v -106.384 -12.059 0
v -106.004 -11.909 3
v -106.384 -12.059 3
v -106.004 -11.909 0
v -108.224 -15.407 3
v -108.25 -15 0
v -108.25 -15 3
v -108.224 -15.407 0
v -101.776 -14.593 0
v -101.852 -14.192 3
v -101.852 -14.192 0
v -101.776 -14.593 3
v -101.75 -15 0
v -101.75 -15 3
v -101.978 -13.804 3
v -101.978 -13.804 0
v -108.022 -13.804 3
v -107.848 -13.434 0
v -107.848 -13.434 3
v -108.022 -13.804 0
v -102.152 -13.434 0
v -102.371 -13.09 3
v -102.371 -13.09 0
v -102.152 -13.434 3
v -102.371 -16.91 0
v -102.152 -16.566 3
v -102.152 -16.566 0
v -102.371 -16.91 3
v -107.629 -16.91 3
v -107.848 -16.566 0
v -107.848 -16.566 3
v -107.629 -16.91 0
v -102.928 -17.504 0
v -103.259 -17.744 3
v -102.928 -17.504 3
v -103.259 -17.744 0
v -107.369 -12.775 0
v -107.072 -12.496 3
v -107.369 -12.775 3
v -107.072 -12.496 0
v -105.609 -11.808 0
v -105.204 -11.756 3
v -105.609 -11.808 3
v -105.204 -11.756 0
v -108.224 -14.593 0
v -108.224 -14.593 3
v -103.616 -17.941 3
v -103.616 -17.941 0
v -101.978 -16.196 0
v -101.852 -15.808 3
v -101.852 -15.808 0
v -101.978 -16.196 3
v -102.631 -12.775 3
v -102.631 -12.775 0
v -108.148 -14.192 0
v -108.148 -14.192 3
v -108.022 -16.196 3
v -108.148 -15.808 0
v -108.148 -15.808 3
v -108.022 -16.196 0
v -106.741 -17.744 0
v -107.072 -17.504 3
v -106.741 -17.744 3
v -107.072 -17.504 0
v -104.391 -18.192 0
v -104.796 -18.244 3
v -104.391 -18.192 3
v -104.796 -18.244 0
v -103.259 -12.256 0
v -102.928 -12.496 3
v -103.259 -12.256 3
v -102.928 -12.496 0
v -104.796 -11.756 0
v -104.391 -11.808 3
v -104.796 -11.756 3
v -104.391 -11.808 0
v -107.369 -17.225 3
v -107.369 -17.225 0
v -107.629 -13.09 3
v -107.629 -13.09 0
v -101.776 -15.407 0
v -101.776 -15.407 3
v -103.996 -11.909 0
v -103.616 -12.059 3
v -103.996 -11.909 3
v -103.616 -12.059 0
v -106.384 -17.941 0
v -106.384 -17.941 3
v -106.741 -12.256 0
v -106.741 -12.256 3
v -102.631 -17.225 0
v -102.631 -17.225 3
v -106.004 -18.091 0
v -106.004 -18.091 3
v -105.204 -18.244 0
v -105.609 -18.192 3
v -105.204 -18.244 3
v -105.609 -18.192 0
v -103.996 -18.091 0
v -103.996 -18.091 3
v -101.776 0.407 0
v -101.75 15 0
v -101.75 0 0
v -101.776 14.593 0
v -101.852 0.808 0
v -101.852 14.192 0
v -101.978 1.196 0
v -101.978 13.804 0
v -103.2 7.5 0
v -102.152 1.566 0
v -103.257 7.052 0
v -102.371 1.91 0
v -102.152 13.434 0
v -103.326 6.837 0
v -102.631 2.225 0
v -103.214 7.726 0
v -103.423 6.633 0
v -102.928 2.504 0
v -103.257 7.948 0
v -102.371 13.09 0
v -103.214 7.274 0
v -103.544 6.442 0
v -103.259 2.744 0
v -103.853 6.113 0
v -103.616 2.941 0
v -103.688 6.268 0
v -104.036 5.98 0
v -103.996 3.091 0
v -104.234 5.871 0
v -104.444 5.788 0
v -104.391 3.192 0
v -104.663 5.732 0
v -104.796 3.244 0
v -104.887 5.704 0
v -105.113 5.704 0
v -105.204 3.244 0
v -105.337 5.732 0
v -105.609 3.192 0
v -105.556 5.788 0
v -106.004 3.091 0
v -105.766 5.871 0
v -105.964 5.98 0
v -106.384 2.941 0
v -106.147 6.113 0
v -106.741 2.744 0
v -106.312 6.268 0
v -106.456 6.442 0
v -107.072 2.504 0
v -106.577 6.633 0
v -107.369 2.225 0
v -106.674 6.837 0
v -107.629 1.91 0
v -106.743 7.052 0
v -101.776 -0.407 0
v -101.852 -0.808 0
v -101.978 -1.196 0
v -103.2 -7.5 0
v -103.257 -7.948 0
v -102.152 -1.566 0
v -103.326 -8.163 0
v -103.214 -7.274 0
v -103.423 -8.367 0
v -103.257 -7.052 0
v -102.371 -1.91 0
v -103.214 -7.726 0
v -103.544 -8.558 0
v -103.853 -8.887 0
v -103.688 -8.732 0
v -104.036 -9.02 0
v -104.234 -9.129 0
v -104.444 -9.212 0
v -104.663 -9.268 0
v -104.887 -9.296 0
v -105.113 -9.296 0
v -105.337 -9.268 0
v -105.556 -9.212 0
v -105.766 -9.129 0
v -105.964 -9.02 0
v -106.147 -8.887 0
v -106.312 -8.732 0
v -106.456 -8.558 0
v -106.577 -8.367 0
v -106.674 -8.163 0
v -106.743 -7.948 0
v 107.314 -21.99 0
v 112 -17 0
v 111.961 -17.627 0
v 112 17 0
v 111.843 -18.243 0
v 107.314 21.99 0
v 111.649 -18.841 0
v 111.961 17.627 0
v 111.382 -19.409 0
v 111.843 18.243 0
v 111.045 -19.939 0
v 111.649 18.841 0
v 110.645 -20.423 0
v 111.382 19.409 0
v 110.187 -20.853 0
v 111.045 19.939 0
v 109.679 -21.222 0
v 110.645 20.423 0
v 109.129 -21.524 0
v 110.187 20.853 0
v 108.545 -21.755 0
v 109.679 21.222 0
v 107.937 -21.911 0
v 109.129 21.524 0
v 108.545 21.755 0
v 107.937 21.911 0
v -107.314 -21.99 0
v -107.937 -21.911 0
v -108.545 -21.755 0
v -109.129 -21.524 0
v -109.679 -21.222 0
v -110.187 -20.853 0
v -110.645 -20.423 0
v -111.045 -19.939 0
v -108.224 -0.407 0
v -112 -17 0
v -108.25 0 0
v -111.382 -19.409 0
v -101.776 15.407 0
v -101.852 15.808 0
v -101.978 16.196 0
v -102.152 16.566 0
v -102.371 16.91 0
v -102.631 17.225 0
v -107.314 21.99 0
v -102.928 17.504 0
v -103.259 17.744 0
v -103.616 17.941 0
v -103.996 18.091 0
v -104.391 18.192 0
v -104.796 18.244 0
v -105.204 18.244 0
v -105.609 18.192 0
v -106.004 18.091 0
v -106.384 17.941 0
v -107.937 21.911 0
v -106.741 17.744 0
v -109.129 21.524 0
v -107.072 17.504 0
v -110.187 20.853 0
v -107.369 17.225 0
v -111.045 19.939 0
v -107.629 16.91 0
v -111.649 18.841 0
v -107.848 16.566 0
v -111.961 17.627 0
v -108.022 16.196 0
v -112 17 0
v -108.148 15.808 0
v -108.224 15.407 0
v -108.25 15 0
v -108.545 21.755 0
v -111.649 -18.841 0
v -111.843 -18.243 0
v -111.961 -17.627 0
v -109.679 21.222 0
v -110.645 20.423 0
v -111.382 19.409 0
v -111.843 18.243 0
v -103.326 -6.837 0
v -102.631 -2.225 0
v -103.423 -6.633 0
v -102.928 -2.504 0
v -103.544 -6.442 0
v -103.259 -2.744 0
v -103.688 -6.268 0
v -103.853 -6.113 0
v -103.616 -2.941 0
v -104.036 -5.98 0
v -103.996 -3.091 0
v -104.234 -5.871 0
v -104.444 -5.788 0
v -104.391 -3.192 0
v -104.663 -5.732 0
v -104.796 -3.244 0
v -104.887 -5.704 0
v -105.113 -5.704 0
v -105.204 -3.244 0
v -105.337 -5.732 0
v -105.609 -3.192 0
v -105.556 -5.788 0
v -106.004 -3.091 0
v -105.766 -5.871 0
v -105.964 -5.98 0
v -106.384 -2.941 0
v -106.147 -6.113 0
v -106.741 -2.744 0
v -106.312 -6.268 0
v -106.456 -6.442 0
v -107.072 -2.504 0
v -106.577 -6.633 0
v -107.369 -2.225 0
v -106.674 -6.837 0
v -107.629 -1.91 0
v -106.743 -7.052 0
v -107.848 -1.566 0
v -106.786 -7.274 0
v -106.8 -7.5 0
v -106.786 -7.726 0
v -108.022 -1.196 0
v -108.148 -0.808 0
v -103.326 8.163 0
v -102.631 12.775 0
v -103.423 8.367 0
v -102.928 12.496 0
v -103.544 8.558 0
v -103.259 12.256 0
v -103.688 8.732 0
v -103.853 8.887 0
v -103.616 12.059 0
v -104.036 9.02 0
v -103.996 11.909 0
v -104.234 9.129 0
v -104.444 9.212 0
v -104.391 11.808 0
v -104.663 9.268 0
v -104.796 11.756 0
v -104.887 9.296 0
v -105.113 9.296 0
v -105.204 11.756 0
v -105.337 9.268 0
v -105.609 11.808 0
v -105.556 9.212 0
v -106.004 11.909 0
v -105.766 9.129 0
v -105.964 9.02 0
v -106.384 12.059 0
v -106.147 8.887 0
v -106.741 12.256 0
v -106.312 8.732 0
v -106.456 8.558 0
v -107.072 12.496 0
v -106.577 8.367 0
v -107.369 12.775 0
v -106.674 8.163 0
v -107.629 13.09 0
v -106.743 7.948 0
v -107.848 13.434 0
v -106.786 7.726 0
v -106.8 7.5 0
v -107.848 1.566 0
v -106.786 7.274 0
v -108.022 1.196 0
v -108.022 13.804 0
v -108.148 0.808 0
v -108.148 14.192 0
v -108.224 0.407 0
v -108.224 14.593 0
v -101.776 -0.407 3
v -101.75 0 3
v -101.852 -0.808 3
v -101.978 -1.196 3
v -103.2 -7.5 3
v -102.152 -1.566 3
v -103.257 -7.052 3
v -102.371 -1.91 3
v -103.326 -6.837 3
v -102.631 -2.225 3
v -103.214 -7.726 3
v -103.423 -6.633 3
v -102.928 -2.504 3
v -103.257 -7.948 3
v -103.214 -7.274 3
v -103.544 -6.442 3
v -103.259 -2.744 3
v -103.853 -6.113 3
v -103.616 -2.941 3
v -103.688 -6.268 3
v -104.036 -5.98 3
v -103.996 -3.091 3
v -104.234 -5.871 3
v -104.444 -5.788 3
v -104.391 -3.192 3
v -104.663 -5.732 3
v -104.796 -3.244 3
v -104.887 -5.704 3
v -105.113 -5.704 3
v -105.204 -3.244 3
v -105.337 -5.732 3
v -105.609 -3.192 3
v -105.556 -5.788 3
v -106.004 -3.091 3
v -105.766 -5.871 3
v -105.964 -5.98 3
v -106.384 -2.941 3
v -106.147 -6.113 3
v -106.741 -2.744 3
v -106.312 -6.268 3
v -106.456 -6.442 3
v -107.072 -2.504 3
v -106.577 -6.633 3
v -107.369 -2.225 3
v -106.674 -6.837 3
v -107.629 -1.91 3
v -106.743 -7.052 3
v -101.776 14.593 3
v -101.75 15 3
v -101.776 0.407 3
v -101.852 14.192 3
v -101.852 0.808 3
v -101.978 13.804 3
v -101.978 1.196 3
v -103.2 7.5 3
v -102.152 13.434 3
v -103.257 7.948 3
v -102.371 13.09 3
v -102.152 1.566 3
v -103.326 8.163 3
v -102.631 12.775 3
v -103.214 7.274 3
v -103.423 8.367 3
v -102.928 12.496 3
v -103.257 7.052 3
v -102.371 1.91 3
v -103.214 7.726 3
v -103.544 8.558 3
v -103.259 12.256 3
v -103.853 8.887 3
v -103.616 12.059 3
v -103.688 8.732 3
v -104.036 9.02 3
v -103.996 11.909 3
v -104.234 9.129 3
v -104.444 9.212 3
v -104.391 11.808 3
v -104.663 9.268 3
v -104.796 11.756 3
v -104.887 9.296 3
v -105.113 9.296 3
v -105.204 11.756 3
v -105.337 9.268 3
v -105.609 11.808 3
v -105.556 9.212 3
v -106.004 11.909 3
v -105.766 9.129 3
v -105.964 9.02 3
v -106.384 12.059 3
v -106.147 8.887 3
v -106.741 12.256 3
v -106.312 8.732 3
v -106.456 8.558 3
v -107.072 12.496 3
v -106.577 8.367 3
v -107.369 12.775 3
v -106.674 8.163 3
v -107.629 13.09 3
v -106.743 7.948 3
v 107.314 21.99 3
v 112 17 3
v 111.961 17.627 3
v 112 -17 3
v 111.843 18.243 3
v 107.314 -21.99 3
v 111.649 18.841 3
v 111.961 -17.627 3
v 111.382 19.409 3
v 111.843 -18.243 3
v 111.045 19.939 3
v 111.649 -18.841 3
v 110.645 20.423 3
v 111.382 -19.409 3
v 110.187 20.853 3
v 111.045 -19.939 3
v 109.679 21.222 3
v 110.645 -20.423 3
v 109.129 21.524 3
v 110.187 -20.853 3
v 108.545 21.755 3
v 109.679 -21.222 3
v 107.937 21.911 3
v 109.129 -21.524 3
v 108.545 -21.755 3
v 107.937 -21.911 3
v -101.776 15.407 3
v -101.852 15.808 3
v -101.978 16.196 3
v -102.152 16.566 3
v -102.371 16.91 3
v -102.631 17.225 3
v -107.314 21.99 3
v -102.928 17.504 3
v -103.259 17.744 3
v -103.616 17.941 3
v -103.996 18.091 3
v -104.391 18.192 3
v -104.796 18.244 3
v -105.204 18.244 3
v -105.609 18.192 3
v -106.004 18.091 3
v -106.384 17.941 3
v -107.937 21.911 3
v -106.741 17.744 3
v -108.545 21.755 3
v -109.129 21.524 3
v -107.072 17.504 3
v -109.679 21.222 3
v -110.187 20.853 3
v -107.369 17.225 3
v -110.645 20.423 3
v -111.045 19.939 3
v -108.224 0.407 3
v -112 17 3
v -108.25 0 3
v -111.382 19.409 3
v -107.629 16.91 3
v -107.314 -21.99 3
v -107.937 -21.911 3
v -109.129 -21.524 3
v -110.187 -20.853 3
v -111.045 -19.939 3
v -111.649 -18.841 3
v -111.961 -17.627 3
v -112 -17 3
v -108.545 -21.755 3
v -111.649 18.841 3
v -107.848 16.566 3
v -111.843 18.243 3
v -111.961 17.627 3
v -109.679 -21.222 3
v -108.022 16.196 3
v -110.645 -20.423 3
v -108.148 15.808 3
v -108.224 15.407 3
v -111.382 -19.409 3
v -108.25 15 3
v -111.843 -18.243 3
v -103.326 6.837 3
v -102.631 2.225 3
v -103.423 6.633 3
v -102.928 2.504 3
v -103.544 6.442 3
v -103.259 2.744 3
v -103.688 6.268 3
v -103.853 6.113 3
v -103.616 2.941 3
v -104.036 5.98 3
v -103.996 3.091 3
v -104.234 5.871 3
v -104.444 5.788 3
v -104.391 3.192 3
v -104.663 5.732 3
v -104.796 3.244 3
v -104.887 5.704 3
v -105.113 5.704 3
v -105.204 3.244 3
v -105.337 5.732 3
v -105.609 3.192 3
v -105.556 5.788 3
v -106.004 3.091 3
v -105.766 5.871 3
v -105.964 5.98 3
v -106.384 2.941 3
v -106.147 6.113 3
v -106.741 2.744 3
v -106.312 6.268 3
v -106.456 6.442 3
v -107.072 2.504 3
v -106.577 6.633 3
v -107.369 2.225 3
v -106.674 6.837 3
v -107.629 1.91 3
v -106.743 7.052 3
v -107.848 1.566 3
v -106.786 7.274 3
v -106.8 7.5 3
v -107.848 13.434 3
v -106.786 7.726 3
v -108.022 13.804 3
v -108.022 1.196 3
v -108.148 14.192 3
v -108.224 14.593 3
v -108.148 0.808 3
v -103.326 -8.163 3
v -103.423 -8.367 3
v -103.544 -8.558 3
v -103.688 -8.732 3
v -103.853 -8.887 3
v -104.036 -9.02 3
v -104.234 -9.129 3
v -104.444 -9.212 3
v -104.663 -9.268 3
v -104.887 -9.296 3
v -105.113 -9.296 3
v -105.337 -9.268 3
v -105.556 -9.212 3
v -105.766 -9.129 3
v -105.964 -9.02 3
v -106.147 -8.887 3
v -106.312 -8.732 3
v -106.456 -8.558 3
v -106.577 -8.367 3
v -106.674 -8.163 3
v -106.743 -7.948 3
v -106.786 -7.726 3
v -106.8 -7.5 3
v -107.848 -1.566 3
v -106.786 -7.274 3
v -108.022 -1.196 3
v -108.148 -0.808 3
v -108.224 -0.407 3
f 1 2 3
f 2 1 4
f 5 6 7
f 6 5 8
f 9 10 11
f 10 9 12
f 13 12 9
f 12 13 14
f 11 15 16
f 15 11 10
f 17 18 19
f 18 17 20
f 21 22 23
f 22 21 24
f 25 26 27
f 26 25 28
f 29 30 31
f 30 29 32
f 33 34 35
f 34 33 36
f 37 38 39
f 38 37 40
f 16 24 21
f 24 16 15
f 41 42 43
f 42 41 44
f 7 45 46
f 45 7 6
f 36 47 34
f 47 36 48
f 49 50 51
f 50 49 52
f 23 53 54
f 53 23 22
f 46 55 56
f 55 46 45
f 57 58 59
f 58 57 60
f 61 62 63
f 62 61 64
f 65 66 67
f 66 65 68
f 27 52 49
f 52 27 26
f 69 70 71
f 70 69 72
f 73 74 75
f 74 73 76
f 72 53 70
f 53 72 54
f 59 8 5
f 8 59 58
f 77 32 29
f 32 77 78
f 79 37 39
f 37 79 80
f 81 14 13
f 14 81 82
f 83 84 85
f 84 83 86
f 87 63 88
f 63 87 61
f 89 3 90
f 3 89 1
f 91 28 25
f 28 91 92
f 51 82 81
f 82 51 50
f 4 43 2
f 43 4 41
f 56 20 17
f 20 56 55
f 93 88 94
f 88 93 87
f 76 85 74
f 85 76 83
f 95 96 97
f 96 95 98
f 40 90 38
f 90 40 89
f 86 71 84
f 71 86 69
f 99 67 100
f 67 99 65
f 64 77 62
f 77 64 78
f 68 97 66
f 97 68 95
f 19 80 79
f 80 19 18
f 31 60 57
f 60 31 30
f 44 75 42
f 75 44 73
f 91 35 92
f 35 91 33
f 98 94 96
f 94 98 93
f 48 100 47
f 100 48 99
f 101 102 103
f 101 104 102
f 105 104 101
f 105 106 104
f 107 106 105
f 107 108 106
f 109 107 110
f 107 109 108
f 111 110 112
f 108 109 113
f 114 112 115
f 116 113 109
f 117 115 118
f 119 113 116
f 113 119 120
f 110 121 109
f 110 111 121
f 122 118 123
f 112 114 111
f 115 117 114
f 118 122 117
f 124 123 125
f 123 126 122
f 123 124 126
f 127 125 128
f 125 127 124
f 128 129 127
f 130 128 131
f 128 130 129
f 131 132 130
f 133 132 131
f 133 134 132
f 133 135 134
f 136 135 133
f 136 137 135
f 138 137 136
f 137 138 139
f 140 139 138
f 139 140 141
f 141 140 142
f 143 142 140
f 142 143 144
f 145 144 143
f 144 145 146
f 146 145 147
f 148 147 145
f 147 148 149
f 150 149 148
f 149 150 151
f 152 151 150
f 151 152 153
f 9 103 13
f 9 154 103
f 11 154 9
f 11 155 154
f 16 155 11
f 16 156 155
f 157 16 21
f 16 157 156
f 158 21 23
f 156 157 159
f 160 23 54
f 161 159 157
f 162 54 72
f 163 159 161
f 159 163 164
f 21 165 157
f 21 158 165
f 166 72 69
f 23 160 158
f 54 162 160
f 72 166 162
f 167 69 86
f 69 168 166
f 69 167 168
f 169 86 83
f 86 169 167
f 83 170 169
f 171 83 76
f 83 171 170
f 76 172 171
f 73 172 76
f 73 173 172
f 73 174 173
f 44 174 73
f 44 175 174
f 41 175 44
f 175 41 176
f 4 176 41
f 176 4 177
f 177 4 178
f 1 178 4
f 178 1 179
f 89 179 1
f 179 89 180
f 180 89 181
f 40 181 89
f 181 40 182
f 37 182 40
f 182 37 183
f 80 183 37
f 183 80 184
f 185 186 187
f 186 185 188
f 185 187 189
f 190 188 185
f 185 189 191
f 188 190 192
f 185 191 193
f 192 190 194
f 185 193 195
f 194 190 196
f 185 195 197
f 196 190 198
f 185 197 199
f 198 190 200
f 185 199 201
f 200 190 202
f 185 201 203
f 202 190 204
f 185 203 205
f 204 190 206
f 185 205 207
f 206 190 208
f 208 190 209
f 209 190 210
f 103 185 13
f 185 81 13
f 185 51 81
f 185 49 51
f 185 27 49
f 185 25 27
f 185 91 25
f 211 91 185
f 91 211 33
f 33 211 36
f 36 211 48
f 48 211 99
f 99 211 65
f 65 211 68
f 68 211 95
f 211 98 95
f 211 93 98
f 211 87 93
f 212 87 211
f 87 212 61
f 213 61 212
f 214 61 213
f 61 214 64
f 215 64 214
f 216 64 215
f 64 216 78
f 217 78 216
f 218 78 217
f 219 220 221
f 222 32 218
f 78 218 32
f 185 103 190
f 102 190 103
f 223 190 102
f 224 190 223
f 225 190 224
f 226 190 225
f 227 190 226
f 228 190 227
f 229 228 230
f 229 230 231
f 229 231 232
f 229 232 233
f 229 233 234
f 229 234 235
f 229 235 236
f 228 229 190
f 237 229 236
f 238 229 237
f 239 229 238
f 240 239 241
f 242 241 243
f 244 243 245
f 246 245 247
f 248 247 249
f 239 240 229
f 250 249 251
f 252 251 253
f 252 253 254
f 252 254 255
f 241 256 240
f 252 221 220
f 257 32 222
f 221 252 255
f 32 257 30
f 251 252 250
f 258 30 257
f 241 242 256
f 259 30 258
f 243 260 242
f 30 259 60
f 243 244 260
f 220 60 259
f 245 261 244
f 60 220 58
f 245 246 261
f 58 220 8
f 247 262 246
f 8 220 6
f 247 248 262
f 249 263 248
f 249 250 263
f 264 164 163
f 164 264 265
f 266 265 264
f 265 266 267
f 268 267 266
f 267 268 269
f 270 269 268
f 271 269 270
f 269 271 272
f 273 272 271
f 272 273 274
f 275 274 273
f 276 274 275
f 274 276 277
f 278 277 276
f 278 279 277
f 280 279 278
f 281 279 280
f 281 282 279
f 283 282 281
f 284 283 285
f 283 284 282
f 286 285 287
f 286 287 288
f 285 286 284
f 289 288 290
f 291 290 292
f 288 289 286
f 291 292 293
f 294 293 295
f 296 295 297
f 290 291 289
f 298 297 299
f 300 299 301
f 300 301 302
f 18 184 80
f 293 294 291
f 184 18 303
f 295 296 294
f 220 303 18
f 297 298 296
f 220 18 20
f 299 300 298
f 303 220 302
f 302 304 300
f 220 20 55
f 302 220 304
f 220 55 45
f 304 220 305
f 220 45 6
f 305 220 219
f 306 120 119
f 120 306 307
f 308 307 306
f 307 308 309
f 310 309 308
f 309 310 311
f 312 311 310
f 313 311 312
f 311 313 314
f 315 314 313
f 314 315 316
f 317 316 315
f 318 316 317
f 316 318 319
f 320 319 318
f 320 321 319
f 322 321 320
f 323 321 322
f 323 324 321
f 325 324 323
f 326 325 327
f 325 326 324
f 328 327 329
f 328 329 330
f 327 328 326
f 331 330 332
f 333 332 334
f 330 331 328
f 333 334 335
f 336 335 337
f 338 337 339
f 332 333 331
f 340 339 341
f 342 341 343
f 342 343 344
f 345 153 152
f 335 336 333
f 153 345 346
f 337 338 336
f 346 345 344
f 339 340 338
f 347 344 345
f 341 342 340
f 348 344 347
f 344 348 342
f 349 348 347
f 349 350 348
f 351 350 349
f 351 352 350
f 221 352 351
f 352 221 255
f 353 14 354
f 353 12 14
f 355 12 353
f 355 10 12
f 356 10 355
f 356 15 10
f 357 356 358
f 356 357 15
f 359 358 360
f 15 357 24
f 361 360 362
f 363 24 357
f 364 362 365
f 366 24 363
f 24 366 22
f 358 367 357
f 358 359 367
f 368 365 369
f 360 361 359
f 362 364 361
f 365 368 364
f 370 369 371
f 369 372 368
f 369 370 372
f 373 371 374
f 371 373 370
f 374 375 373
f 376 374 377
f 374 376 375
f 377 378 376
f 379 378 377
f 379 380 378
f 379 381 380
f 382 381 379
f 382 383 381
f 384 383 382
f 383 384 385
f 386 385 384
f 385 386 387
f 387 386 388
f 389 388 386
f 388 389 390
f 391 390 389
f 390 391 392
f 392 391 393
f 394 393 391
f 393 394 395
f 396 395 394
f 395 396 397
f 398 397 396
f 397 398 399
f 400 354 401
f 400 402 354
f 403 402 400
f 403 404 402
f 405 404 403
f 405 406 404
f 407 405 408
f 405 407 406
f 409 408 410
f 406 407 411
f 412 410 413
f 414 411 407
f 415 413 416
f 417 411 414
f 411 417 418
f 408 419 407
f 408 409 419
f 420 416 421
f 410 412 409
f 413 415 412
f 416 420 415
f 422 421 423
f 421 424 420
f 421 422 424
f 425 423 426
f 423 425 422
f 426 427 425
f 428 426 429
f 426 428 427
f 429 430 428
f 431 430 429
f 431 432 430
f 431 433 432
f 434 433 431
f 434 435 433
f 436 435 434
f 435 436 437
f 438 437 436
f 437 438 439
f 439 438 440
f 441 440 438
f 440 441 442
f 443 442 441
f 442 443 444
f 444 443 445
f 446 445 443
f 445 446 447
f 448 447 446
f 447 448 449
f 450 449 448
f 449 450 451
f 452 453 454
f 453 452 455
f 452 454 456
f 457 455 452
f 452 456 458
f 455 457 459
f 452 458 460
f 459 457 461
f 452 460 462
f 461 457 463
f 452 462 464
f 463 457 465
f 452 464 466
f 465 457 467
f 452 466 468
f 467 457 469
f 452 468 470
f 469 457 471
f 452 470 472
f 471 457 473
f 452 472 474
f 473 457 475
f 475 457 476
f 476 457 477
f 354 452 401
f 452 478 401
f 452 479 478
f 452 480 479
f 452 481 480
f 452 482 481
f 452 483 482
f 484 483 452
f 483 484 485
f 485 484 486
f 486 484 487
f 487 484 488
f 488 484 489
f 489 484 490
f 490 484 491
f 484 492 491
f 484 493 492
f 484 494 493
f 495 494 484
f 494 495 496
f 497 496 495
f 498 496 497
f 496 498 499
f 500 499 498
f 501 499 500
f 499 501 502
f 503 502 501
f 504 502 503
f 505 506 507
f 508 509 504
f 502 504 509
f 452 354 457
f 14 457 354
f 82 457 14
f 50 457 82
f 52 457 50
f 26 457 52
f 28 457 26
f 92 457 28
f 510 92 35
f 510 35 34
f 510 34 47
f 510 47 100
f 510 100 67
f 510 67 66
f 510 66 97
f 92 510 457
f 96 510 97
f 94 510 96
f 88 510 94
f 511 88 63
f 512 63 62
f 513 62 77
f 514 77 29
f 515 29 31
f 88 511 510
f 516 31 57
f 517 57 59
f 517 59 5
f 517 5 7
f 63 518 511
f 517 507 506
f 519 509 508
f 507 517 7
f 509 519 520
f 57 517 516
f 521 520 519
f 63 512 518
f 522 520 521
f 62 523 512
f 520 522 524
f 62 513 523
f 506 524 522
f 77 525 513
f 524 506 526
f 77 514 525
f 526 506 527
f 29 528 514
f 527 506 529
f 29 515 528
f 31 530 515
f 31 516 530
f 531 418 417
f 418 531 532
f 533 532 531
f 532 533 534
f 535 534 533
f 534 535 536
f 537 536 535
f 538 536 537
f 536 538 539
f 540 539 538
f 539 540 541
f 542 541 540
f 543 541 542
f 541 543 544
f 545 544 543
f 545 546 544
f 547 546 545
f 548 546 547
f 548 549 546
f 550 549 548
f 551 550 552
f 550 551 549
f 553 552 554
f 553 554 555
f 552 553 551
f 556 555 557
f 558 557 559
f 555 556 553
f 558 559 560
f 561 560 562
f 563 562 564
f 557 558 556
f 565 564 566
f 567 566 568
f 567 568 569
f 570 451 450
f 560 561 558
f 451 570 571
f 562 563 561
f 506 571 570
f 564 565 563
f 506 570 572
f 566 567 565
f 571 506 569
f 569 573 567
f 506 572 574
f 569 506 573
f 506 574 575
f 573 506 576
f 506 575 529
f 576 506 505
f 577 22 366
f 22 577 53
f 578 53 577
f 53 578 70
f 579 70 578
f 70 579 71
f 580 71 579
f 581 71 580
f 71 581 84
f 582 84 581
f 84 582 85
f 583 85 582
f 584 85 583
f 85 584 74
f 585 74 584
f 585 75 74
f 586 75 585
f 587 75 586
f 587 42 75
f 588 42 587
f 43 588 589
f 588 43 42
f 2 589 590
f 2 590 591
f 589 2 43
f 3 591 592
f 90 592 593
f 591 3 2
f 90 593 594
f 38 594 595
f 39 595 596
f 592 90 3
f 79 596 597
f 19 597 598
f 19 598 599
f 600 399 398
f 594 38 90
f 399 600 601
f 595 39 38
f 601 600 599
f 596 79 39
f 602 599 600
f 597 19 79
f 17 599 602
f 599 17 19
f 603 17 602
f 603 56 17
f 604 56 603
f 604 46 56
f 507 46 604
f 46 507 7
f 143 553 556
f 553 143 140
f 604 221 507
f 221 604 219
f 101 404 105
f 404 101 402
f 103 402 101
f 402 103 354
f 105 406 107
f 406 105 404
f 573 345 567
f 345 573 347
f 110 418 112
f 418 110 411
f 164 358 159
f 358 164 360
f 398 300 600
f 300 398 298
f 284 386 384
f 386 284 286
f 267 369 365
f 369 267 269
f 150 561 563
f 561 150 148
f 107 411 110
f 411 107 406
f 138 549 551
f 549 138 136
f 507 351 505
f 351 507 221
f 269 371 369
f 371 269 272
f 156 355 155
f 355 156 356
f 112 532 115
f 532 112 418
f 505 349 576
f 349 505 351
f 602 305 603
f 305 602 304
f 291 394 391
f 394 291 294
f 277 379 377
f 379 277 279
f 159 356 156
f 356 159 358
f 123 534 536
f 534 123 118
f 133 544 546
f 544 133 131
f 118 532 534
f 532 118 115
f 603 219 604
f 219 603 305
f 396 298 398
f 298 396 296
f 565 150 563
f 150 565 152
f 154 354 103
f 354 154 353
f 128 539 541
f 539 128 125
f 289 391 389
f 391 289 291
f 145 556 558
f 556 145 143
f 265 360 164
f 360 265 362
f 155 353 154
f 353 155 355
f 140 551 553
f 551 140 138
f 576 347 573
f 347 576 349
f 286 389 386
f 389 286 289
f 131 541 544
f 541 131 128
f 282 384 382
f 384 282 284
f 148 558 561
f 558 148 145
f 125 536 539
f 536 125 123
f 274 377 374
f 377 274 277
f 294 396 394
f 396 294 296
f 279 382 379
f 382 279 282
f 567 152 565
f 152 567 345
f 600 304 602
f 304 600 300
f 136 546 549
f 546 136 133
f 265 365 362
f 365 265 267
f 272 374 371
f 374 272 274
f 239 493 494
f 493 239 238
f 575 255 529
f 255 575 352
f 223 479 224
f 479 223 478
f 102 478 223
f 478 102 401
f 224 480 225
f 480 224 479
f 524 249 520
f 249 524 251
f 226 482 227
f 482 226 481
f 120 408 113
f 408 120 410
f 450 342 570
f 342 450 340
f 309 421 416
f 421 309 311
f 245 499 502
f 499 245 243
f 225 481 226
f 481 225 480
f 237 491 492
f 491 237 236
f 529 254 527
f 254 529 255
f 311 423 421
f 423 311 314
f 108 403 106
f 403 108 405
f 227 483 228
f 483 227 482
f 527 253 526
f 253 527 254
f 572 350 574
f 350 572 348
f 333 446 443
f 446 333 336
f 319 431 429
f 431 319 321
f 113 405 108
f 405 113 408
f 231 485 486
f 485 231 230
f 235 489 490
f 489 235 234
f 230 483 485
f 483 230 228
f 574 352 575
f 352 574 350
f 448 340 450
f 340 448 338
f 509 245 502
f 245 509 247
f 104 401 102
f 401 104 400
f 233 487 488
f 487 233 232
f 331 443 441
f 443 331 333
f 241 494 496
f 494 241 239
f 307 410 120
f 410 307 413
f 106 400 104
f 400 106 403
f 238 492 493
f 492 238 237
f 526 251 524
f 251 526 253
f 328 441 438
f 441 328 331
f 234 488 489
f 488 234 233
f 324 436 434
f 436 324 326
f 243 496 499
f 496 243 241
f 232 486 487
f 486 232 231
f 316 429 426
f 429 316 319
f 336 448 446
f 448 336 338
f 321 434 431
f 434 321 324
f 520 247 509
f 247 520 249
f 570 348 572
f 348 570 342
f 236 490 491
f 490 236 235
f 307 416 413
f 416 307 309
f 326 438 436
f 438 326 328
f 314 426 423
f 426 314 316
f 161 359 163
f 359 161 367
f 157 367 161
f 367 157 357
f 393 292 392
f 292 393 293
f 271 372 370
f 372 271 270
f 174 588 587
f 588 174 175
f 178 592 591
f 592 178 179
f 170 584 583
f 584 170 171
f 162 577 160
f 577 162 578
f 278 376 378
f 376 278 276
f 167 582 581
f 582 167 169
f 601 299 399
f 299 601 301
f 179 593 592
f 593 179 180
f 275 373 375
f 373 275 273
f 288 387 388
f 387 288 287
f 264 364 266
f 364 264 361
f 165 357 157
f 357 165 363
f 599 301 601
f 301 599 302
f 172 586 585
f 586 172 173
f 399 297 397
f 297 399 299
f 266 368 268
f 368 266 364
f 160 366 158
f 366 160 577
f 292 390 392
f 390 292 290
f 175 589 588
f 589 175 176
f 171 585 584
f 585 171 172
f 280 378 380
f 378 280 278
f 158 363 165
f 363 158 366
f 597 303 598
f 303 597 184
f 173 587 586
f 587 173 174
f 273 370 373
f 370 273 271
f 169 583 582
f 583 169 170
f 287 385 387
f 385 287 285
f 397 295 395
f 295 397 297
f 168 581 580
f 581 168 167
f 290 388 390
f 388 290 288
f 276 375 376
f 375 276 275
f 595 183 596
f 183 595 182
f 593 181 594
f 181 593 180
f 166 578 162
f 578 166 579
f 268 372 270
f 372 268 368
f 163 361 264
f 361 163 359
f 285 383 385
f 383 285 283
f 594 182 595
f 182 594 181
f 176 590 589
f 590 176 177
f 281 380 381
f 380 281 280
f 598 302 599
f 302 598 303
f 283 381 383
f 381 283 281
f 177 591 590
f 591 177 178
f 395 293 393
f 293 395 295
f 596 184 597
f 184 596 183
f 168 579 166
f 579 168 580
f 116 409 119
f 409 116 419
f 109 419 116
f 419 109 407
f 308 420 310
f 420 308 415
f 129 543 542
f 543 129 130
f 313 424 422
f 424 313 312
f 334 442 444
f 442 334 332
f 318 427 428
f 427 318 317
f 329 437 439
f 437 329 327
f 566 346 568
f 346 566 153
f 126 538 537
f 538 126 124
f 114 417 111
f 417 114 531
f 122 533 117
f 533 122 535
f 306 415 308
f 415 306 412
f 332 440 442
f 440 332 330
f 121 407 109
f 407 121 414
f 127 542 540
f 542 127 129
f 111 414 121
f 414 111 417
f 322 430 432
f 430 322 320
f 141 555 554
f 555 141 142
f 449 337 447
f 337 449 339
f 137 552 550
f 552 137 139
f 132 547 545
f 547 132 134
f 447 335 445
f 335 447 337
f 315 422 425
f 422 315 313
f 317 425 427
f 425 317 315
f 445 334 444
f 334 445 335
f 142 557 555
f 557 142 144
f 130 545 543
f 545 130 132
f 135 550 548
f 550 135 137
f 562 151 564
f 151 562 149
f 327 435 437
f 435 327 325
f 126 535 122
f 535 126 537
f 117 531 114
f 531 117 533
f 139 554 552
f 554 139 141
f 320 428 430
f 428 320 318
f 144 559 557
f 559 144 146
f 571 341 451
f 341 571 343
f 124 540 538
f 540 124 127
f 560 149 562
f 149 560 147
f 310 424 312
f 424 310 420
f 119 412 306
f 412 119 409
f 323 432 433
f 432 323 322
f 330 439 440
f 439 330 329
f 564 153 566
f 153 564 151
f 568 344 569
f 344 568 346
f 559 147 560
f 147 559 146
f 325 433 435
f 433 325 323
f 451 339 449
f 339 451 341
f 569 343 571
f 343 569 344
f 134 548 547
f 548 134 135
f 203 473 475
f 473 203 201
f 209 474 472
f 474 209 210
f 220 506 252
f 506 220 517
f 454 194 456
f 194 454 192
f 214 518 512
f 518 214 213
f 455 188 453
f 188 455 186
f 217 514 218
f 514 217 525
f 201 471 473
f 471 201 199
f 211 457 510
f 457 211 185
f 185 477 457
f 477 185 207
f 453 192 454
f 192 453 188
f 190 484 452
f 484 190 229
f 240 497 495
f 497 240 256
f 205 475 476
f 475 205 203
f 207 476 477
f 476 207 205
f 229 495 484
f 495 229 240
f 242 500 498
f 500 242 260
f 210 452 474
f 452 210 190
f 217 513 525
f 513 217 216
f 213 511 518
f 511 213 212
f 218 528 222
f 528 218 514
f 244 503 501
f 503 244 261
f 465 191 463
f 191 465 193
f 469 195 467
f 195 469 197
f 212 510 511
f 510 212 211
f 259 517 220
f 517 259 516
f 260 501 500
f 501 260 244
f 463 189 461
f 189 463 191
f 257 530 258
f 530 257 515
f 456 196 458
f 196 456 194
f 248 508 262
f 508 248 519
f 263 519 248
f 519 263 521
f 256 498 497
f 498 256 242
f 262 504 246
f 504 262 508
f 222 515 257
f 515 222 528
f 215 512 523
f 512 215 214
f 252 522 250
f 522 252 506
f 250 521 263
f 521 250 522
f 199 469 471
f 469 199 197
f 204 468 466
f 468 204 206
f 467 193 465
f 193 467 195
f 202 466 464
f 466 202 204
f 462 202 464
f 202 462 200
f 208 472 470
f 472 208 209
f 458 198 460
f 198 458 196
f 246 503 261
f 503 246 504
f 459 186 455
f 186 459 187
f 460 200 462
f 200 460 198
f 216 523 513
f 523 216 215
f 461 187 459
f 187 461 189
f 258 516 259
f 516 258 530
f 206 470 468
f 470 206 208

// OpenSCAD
$fn = 50;


difference() {
	union() {
		hull() {
			translate(v = [-107.0000000000, 17.0000000000, 0]) {
				cylinder(h = 3, r = 5);
			}
			translate(v = [107.0000000000, 17.0000000000, 0]) {
				cylinder(h = 3, r = 5);
			}
			translate(v = [-107.0000000000, -17.0000000000, 0]) {
				cylinder(h = 3, r = 5);
			}
			translate(v = [107.0000000000, -17.0000000000, 0]) {
				cylinder(h = 3, r = 5);
			}
		}
	}
	union() {
		translate(v = [-105.0000000000, -15.0000000000, 0]) {
			cylinder(h = 3, r = 3.2500000000);
		}
		translate(v = [-105.0000000000, 0.0000000000, 0]) {
			cylinder(h = 3, r = 3.2500000000);
		}
		translate(v = [-105.0000000000, 15.0000000000, 0]) {
			cylinder(h = 3, r = 3.2500000000);
		}
		translate(v = [-105.0000000000, -15.0000000000, 0]) {
			cylinder(h = 3, r = 1.8000000000);
		}
		translate(v = [-105.0000000000, -7.5000000000, 0]) {
			cylinder(h = 3, r = 1.8000000000);
		}
		translate(v = [-105.0000000000, 0.0000000000, 0]) {
			cylinder(h = 3, r = 1.8000000000);
		}
		translate(v = [-105.0000000000, 7.5000000000, 0]) {
			cylinder(h = 3, r = 1.8000000000);
		}
		translate(v = [-105.0000000000, 15.0000000000, 0]) {
			cylinder(h = 3, r = 1.8000000000);
		}
		translate(v = [-105.0000000000, -15.0000000000, 0]) {
			cylinder(h = 3, r = 1.8000000000);
		}
		translate(v = [-105.0000000000, -7.5000000000, 0]) {
			cylinder(h = 3, r = 1.8000000000);
		}
		translate(v = [-105.0000000000, 0.0000000000, 0]) {
			cylinder(h = 3, r = 1.8000000000);
		}
		translate(v = [-105.0000000000, 7.5000000000, 0]) {
			cylinder(h = 3, r = 1.8000000000);
		}
		translate(v = [-105.0000000000, 15.0000000000, 0]) {
			cylinder(h = 3, r = 1.8000000000);
		}
		translate(v = [-105.0000000000, -15.0000000000, 0]) {
			cylinder(h = 3, r = 1.8000000000);
		}
		translate(v = [-105.0000000000, -7.5000000000, 0]) {
			cylinder(h = 3, r = 1.8000000000);
		}
		translate(v = [-105.0000000000, 0.0000000000, 0]) {
			cylinder(h = 3, r = 1.8000000000);
		}
		translate(v = [-105.0000000000, 7.5000000000, 0]) {
			cylinder(h = 3, r = 1.8000000000);
		}
		translate(v = [-105.0000000000, 15.0000000000, 0]) {
			cylinder(h = 3, r = 1.8000000000);
		}
	}
}
